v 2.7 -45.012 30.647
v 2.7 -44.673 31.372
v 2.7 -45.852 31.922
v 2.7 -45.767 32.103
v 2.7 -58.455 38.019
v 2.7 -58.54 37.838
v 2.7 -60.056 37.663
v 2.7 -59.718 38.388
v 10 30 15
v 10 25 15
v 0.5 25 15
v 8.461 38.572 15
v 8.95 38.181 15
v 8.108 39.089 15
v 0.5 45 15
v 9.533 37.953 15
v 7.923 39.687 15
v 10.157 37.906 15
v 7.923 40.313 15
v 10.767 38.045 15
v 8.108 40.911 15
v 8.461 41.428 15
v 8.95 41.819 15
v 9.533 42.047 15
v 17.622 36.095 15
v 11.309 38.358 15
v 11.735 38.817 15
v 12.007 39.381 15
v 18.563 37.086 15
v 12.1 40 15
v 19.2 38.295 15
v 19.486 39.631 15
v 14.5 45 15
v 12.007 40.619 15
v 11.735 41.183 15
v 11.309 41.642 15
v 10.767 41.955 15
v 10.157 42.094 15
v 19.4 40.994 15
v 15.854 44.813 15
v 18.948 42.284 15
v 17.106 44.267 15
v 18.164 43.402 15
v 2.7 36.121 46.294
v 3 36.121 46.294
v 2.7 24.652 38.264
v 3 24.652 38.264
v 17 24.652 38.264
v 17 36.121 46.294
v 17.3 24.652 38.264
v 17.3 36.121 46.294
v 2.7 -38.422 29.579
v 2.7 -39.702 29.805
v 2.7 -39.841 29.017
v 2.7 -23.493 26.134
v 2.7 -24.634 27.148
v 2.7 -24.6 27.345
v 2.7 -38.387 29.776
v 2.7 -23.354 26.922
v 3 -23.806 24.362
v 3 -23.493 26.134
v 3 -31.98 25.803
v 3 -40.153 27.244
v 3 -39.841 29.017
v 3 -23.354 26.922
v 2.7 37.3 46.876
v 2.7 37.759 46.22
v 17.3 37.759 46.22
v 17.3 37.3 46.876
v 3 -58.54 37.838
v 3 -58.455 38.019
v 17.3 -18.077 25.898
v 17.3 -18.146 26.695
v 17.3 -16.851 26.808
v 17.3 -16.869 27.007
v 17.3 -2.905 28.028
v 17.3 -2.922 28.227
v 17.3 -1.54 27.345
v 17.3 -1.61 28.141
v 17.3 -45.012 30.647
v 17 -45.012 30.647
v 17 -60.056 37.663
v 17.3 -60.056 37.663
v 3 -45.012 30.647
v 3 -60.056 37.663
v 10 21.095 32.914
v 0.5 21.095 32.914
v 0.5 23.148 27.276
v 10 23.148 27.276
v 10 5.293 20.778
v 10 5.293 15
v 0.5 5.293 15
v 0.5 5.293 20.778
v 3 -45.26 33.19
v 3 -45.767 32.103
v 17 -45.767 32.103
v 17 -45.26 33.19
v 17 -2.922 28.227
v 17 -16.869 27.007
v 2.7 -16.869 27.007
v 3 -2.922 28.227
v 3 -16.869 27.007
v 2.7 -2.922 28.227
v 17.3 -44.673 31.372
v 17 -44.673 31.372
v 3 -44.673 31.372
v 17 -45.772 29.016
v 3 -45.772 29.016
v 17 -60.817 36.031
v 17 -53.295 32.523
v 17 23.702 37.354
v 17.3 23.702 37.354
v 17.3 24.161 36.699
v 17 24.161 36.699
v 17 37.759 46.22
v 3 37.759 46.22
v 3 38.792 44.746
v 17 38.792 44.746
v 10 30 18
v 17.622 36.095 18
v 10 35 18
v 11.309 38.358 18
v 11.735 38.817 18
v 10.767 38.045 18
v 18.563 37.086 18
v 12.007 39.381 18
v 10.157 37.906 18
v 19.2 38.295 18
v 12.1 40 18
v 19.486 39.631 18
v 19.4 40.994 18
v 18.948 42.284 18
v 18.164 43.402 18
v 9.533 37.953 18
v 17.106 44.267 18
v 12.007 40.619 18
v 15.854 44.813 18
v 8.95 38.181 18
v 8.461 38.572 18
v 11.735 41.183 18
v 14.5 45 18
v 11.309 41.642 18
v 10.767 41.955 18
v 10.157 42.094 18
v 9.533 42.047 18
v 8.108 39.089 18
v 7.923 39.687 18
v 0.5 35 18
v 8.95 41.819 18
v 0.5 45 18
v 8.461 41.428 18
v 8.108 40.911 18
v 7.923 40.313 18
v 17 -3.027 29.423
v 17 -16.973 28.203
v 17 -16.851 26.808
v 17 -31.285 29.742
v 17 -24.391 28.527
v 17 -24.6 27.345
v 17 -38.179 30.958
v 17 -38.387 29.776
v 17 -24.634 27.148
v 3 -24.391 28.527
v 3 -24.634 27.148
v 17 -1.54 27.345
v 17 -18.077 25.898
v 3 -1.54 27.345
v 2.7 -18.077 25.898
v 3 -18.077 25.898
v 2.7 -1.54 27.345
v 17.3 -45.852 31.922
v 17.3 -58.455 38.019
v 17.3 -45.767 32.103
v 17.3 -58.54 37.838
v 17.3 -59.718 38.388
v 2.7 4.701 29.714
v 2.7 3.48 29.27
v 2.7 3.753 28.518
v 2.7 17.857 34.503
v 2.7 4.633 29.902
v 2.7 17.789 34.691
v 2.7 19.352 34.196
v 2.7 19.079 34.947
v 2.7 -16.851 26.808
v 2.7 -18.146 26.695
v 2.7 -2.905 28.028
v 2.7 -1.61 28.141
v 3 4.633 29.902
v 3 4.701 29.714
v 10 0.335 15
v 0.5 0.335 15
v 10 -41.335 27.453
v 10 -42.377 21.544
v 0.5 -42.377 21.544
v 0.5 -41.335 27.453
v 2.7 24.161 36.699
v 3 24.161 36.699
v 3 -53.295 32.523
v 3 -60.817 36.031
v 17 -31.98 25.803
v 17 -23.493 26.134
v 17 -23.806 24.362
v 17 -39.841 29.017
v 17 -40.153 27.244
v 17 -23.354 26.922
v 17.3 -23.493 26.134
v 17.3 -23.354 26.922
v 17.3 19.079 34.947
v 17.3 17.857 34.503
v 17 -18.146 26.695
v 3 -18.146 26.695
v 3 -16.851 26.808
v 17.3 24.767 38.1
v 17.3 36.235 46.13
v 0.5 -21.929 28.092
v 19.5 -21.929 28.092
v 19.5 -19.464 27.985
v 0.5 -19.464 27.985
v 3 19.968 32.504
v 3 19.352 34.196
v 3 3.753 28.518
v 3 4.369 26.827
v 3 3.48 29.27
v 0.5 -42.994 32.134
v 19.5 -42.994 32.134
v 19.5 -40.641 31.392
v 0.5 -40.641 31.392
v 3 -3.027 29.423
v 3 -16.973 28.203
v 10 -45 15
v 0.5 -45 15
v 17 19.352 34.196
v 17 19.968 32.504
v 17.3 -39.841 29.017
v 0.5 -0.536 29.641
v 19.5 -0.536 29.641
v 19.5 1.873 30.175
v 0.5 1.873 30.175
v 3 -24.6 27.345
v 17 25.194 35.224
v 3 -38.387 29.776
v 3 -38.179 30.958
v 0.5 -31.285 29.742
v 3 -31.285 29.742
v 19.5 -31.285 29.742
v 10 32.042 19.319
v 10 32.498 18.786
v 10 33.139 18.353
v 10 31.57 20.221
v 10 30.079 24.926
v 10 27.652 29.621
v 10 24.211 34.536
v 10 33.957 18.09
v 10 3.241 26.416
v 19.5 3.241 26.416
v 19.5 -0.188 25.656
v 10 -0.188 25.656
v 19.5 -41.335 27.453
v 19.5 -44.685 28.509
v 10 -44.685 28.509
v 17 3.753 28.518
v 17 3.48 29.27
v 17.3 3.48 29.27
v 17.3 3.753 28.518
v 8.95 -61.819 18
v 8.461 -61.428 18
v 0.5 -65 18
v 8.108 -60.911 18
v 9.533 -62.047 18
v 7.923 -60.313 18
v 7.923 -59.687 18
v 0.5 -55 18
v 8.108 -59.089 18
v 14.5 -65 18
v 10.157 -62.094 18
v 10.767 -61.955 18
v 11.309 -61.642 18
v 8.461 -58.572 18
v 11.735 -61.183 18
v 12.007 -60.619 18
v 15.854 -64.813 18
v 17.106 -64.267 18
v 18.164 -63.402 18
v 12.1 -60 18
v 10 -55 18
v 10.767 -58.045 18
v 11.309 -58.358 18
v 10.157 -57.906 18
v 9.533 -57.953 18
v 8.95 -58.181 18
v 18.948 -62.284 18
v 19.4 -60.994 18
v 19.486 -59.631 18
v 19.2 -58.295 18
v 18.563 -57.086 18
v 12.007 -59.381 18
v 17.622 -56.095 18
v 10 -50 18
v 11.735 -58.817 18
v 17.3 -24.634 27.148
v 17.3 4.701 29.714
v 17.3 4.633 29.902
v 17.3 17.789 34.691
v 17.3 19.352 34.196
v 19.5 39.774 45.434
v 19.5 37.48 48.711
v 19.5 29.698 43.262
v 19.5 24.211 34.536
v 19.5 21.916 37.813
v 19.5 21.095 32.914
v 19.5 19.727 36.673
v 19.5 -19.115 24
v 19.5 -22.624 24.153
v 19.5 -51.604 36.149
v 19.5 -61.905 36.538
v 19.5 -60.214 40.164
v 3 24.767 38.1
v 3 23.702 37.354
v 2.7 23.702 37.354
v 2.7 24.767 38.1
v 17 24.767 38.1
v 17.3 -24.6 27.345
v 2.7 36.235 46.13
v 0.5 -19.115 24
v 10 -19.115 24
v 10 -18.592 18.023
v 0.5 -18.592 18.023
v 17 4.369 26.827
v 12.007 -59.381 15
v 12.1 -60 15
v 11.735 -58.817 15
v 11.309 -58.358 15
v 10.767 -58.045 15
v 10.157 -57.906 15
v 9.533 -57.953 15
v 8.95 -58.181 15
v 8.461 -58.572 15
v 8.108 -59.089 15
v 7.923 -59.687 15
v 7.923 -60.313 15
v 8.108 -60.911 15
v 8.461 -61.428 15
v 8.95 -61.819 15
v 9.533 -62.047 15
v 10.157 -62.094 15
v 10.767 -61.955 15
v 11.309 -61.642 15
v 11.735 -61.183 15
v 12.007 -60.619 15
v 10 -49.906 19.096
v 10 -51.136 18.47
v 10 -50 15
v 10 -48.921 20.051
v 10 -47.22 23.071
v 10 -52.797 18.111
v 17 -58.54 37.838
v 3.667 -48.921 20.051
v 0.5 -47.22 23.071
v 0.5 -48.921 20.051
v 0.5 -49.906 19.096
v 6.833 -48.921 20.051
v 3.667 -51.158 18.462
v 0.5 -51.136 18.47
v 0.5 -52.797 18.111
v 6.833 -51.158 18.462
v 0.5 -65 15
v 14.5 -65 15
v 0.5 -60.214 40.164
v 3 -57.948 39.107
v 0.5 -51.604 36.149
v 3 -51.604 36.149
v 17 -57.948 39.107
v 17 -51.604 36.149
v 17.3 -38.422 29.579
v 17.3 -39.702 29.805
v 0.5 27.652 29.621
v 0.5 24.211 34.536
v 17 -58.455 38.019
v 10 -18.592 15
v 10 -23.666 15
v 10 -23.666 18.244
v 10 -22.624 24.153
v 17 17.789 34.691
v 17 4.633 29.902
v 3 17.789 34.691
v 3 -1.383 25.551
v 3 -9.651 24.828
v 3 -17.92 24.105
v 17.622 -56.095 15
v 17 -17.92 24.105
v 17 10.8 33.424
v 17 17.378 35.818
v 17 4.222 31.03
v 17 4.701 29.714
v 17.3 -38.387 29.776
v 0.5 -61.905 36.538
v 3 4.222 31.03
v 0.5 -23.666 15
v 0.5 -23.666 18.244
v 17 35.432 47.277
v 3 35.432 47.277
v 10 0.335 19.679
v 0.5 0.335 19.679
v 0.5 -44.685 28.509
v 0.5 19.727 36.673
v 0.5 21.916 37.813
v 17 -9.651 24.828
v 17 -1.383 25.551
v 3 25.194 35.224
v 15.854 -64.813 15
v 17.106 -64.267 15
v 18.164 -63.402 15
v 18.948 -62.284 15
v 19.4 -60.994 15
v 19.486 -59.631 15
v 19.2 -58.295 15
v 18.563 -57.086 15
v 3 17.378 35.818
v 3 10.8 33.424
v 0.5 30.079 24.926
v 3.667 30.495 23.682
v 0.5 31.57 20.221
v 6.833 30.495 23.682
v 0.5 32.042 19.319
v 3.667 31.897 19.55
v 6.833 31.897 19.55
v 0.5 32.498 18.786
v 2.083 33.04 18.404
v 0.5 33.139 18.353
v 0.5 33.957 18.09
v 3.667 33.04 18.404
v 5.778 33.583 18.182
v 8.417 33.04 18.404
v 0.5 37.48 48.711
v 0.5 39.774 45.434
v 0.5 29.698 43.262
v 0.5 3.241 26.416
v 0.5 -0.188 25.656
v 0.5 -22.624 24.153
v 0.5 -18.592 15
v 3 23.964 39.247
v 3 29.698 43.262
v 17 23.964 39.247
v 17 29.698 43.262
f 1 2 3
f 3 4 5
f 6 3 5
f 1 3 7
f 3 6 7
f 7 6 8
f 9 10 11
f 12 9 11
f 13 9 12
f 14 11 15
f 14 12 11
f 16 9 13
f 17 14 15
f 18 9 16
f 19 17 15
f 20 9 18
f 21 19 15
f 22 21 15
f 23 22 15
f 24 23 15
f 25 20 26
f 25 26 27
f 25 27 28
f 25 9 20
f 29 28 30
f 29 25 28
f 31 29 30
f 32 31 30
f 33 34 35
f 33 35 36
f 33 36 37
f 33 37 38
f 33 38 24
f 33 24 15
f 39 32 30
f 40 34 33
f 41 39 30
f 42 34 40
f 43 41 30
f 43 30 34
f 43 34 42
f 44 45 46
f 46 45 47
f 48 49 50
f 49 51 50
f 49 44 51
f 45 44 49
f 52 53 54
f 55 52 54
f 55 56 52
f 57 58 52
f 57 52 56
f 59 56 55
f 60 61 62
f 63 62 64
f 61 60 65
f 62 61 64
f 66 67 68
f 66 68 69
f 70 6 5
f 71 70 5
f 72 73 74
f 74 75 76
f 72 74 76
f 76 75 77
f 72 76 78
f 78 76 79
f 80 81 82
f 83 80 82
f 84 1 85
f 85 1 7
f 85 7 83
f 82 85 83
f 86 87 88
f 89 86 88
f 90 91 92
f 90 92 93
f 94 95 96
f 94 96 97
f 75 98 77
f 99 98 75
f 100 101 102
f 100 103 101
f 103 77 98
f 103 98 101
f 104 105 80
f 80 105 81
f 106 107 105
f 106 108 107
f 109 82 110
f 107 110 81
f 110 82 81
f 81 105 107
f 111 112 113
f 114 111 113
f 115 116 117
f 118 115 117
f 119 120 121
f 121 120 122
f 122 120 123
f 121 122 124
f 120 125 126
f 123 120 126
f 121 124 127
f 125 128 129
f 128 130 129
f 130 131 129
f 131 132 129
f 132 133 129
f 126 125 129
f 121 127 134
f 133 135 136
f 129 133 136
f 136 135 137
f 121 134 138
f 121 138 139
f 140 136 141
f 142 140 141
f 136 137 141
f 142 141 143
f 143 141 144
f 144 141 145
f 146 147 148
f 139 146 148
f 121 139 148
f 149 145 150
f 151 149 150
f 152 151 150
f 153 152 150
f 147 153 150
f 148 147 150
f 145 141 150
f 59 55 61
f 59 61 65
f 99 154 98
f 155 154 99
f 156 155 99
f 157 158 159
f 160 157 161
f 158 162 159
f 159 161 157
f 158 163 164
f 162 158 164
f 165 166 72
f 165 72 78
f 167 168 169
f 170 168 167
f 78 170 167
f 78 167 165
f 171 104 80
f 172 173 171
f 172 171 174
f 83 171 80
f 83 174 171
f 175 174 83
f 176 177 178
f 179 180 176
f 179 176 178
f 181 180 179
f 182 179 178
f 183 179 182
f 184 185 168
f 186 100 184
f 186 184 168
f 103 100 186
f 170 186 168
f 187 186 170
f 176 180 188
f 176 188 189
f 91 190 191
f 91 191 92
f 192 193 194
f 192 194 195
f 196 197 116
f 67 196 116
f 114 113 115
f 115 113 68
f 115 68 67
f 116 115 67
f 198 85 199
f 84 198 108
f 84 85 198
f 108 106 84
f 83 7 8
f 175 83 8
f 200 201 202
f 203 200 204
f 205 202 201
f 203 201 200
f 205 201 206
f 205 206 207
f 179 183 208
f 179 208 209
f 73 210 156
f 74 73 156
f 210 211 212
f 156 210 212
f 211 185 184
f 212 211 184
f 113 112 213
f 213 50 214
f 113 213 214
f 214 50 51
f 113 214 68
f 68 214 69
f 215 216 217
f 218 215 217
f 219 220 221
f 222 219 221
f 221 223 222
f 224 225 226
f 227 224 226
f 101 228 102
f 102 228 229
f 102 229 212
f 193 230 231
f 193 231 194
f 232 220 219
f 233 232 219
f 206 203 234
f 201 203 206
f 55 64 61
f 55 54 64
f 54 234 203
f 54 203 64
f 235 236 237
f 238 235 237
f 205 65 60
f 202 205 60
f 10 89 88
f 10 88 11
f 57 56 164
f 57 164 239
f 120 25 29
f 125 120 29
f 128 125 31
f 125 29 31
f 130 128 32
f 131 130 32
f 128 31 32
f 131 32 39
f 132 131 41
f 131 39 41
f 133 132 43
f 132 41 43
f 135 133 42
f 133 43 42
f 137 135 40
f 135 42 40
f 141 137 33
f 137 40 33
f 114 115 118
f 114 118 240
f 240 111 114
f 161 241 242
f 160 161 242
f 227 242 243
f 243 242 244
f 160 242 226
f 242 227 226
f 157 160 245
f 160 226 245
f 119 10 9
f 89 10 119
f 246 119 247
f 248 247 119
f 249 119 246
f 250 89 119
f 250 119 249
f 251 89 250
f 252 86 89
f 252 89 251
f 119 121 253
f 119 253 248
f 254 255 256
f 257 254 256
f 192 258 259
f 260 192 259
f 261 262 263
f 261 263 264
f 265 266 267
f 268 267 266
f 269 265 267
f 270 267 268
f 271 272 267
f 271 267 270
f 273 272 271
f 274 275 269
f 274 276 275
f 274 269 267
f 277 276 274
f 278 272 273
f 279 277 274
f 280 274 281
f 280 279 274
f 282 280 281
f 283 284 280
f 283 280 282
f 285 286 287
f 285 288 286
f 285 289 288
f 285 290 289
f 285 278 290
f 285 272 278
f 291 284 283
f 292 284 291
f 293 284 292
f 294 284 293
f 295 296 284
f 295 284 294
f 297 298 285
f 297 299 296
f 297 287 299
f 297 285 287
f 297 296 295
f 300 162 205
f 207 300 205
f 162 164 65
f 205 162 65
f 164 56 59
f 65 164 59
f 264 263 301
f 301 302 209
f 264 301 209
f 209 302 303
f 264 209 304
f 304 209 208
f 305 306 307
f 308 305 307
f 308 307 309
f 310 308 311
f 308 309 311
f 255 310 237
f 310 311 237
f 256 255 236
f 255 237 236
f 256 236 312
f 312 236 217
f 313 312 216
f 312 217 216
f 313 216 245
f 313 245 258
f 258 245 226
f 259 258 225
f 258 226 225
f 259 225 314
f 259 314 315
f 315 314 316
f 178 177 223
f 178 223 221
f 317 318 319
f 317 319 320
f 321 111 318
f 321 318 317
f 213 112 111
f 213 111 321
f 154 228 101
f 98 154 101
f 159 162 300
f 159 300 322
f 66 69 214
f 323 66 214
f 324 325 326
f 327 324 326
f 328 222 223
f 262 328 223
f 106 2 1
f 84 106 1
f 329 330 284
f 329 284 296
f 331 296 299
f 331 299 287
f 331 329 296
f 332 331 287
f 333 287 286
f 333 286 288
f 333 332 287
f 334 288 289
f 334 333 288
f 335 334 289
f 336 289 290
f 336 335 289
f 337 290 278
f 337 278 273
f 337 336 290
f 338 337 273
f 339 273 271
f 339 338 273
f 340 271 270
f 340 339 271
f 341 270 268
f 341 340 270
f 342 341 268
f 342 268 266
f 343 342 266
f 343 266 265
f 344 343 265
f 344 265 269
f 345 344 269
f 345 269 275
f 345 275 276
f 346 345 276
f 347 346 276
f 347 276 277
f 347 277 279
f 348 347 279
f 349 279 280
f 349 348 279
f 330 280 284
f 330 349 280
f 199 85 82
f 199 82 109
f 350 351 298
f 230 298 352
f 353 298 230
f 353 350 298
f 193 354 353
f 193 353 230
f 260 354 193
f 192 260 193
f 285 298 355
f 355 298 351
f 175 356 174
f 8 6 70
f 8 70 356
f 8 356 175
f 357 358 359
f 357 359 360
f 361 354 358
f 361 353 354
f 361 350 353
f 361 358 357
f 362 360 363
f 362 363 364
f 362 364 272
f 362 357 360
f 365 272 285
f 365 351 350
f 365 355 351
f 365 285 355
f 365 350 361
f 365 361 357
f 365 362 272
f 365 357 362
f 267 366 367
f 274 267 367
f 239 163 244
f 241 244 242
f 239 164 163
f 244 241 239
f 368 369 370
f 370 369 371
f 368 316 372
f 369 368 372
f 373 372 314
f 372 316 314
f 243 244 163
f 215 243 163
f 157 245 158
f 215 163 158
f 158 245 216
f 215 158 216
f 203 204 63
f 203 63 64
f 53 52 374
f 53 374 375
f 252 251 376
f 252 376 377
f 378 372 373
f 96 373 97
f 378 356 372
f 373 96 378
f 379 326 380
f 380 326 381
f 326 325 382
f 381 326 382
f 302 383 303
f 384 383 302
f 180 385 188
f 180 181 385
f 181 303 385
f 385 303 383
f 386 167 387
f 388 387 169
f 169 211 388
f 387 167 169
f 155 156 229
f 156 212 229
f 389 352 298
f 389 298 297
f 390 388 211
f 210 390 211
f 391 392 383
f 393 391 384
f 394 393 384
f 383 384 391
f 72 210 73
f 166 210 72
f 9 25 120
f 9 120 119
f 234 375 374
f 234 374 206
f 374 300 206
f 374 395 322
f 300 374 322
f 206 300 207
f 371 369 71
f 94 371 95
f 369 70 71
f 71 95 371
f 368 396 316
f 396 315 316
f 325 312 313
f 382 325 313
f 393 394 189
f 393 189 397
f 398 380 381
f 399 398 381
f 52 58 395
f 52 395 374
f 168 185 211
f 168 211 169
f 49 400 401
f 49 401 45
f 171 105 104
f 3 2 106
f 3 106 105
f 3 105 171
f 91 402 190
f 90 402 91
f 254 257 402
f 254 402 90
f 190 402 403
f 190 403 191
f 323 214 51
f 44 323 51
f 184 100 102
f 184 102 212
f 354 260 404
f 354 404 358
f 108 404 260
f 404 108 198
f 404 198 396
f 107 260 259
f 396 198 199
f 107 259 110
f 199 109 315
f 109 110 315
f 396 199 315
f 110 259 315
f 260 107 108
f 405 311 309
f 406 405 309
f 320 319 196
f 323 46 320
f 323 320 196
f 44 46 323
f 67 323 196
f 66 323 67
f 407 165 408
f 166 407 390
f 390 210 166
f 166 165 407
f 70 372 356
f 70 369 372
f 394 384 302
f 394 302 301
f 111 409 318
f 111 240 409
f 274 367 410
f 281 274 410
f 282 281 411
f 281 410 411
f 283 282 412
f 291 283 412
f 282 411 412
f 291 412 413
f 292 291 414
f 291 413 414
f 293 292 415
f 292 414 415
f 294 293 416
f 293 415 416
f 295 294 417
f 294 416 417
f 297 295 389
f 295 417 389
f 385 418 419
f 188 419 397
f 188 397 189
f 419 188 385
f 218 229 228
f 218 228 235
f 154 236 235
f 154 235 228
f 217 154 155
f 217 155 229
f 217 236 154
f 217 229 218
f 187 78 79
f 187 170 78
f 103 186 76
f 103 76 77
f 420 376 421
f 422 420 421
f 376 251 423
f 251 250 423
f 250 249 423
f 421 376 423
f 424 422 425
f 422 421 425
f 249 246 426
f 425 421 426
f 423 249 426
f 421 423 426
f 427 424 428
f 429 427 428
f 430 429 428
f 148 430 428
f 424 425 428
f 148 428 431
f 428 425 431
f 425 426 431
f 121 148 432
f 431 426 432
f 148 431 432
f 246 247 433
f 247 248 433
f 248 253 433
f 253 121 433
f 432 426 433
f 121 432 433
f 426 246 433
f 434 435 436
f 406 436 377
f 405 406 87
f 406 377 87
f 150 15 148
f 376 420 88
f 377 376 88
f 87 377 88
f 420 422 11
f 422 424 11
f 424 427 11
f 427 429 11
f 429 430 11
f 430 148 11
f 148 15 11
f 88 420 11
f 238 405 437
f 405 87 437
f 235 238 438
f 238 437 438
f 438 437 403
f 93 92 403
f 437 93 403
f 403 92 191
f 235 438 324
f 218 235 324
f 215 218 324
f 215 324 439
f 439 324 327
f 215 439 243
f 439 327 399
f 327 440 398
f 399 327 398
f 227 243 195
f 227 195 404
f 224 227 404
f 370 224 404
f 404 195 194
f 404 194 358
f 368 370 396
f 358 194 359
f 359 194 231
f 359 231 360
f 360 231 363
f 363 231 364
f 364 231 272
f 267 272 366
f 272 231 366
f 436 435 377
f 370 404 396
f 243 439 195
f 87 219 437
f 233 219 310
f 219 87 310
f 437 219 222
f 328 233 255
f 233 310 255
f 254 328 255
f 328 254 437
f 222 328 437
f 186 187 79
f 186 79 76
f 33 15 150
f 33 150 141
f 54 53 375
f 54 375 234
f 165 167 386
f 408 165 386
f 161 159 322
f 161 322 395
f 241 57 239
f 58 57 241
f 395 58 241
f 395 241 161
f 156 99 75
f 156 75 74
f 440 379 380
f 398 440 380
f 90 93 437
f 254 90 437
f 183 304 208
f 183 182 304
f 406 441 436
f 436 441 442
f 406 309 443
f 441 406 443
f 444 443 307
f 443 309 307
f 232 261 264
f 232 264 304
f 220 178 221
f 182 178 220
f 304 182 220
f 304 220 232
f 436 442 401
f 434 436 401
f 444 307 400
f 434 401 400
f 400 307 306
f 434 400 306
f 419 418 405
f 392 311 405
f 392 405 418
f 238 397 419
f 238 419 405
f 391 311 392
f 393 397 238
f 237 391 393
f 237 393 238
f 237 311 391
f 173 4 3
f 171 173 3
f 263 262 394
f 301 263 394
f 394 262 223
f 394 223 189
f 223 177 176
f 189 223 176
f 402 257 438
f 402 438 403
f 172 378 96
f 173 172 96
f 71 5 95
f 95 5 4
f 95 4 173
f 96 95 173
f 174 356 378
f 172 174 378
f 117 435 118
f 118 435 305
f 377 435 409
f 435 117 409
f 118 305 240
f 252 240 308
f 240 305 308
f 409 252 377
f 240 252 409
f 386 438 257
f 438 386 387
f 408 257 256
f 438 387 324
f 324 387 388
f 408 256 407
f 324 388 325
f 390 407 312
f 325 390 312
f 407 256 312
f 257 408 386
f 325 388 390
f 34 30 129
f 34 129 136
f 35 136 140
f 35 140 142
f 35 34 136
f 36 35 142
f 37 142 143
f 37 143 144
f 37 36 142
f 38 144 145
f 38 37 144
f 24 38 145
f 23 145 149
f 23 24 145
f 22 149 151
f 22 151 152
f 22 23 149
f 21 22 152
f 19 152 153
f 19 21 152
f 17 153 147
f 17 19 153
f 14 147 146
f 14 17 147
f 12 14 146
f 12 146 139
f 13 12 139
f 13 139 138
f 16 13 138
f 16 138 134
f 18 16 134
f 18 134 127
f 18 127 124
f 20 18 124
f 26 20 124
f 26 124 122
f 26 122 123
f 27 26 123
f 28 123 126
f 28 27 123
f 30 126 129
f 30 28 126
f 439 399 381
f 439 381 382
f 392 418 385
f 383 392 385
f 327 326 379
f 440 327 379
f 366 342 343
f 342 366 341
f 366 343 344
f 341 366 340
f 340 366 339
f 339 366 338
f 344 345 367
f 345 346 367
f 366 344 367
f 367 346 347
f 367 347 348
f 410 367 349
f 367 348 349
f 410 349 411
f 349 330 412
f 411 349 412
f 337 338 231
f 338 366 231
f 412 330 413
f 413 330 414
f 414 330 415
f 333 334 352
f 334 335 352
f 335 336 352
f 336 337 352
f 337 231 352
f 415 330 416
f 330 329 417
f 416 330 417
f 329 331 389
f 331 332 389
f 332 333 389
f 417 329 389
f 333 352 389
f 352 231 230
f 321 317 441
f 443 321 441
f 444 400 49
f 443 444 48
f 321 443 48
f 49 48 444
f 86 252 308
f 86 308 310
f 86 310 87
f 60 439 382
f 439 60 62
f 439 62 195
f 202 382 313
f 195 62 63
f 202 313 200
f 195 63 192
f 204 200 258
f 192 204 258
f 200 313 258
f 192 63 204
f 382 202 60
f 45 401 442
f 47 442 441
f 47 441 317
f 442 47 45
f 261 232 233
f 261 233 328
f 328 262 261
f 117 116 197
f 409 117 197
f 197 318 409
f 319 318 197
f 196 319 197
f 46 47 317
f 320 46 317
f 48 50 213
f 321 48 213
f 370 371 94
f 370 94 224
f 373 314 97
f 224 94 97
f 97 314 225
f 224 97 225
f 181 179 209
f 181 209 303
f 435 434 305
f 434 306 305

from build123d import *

# Parameters (mm, degrees)
PAD_DEPTH       = 9.5
PAD001_DEPTH    = 9.5
SKETCH002_R     = 2.1
PAD002_DEPTH    = 3
POCKET_DEPTH    = 7
POCKET001_DEPTH = 7.3


with BuildPart() as part:
    # Sketch → Pad (new body, symmetric)
    with BuildSketch(Plane.YZ):
        Polygon((-9.4638496319, 12.9847787924), (0, 13.8127583485), (9.4638496319, 14.6407379046), (11.8731622478, 15.1748696522), (20.8002421453, 18.4240610138), (29.7273220428, 21.6732523754), (31.9162958532, 22.8127600156), (39.698240274, 28.2617361609), (47.4801846947, 33.7107123063), (49.7744904401, 30.4341041291), (34.2106015986, 19.5361518385), (31.0954026161, 17.9144818922), (13.2412428211, 11.416099169), (9.8124726029, 10.6559591122), (-9.1152266609, 9), (-12.6239030908, 9.1531921213), (-31.335250398, 12.452507497), (-34.6847225392, 13.5085920065), (-51.9045704929, 21.5383389795), (-50.2140974459, 25.1635701277), (-41.604173469, 21.1486966411), (-32.9942494922, 17.1338231546), (-30.6406576873, 16.391738509), (-21.2849840337, 14.7420808212), (-11.9293103801, 13.0924231333), align=None)
    extrude(amount=PAD_DEPTH, both=True)

    # Sketch001 → Pad001 (join)
    with BuildSketch(Plane.YZ):
        with BuildLine():
            Line((-32.3771396349, 6.543661009), (-30.6406576873, 16.391738509))
            Line((-30.6406576873, 16.391738509), (-32.9942494922, 17.1338231546))
            Line((-32.9942494922, 17.1338231546), (-37.2204319887, 8.0707452278))
            add(Edge.make_bspline(
                [(-37.2204319887, 8.0707452278), (-39.0096730727, 4.2337052069), (-40, 3), (-45, 3)],
                knots=[0, 0, 0, 0, 1, 1, 1, 1], degree=3))
            Line((-45, 3), (-45, 0))
            Line((-45, 0), (-35, 0))
            Line((-35, 0), (-32.3771396349, 6.543661009))
        make_face()
        Polygon((-13.6657925125, 3.2443456659), (-11.9293103801, 13.0924231333), (-9.4638496319, 12.9847787924), (-8.5922920505, 3.0228318249), (-8.5922920505, 0), (-13.6657925125, 0), align=None)
        Polygon((15.2933760081, 5.777947931), (11.8731622478, 15.1748696522), (9.4638496319, 14.6407379046), (10.3354072218, 4.6787909379), (10.3354072218, 0), (15.2933760081, 0), align=None)
        with BuildLine():
            Line((37.6520787719, 14.6212525652), (31.9162958532, 22.8127600156))
            Line((31.9162958532, 22.8127600156), (29.7273220428, 21.6732523754))
            Line((29.7273220428, 21.6732523754), (33.1475397634, 12.2763320956))
            Line((33.1475397634, 12.2763320956), (35, 0))
            Line((35, 0), (45, 0))
            Line((45, 0), (45, 2.9999999999))
            add(Edge.make_bspline(
                [(37.6520787719, 14.6212525652), (42.2621602037, 8.0374056988), (40, 2.999999954), (45, 2.9999999999)],
                knots=[0, 0, 0, 0, 1, 1, 1, 1], degree=3))
        make_face()
    extrude(amount=-PAD001_DEPTH)

    # Sketch002 → Pad002 (join)
    with BuildSketch(Plane.XY):
        with BuildLine():
            Line((0, -45), (-9.5, -45))
            Line((-9.5, -45), (-9.5, -55))
            Line((-9.5, -55), (4.5, -55))
            ThreePointArc((4.5, -55), (9.218348401, -51.6544450327), (7.6224992299, -46.0948753465))
            Line((0, -40), (7.6224992299, -46.0948753465))
            Line((0, -45), (0, -40))
        make_face()
        with Locations((0, -50)):
            Circle(SKETCH002_R, mode=Mode.SUBTRACT)
        with BuildLine():
            Line((0, 40), (0, 45))
            Line((0, 45), (-9.5, 45))
            Line((-9.5, 45), (-9.5, 55))
            Line((-9.5, 55), (4.5, 55))
            ThreePointArc((7.6224992299, 46.0948753465), (9.218348401, 51.6544450327), (4.5, 55))
            Line((7.6224992299, 46.0948753465), (0, 40))
        make_face()
        with Locations((0, 50)):
            Circle(SKETCH002_R, mode=Mode.SUBTRACT)
    extrude(amount=PAD002_DEPTH)

    # Sketch003 → Pocket (cut, symmetric)
    with BuildSketch(Plane.YZ):
        Polygon((-41.604173469, 21.1486966411), (-47.9483279783, 24.1070244733), (-48.540006161, 22.8381994546), (-49.718193731, 23.3875973412), (-50.8170011484, 21.0311970654), (-43.294646516, 17.523465493), (-35.7722918836, 14.0157339205), (-34.6734849555, 16.3721344244), (-35.85169762, 16.9215440128), (-35.2600189598, 18.190368809), align=None)
        Polygon((-28.1786383048, 15.9576180648), (-21.2849840337, 14.7420808212), (-14.3913297626, 13.5265435775), (-14.6344411843, 12.1478134238), (-13.3541878452, 11.922070218), (-13.8056723944, 9.3615699345), (-21.9795767444, 10.8028498091), (-30.1534810944, 12.2441296838), (-29.7019944172, 14.804629592), (-28.4217543468, 14.5788887258), align=None)
        Polygon((-6.9733628866, 13.2026681492), (0, 13.8127583484), (6.9733628866, 14.4228485476), (7.095382718, 13.0281761271), (8.3904355218, 13.141478566), (8.6170389651, 10.5513722208), (0.348622971, 9.8279795561), (-7.9197930232, 9.1045868913), (-8.1463876723, 11.6946940059), (-6.8513440135, 11.8079956448), align=None)
        Polygon((14.2223937998, 16.0299200105), (20.8002421453, 18.4240610138), (27.3780904908, 20.818202017), (27.8569247953, 19.5026345695), (29.078522765, 19.9472598688), (29.9677714711, 17.5040577202), (22.1683227186, 14.6652905306), (14.3688739661, 11.826523341), (13.4796328313, 14.2697282453), (14.7012277436, 14.7143524317), align=None)
        Polygon((33.964175964, 24.2467011065), (39.698240274, 28.2617361609), (45.432304584, 32.2767712154), (46.2353249737, 31.1299677214), (47.3002248466, 31.8756186398), (48.7915131317, 29.7458160079), (42.5661276004, 24.1659795418), (35.1935891965, 20.2244471644), (33.7022965595, 22.3542467491), (34.7671909619, 23.0998938371), align=None)
    extrude(amount=POCKET_DEPTH, both=True, mode=Mode.SUBTRACT)

    # Sketch004 → Pocket001 (cut, symmetric)
    with BuildSketch(Plane.YZ):
        Polygon((-48.4554802378, 23.0194599531), (-35.767171314, 17.1028043329), (-35.85169762, 16.9215440128), (-34.6734849555, 16.3721344244), (-35.0115879447, 15.6470921024), (-50.0562968731, 22.6625550904), (-49.718193731, 23.3875973412), (-48.540006161, 22.8381994546), align=None)
        Polygon((-29.7019944172, 14.804629592), (-29.8409228744, 14.0167851379), (-13.4931156588, 11.1342256504), (-13.3541878452, 11.922070218), (-14.6344411843, 12.1478134238), (-14.5997166858, 12.3447758803), (-28.3870287718, 14.7758509925), (-28.4217543468, 14.5788887258), align=None)
        Polygon((-6.8687714614, 12.0072349082), (-6.8513440135, 11.8079956448), (-8.1463876723, 11.6946940059), (-8.0766611038, 10.8977384201), (8.4601662766, 12.3445233466), (8.3904355218, 13.141478566), (7.095382718, 13.0281761271), (7.0779548525, 13.2274153539), align=None)
        Polygon((14.6328259169, 14.9022917574), (14.7012277436, 14.7143524317), (13.4796328313, 14.2697282453), (13.753251107, 13.5179749352), (29.3521455498, 19.1955081999), (29.078522765, 19.9472598688), (27.8569247953, 19.5026345695), (27.7885225257, 19.690573734), align=None)
        Polygon((34.7671909619, 23.0998938371), (33.7022965595, 22.3542467491), (34.1611654182, 21.698930512), (47.7590897918, 31.2202996624), (47.3002248466, 31.8756186398), (46.2353249737, 31.1299677214), (46.1206093491, 31.2937978941), (34.6524768556, 23.2637250729), align=None)
    extrude(amount=POCKET001_DEPTH, both=True, mode=Mode.SUBTRACT)


with BuildPart() as part_1:
    # Body placement: moved
    add(part.part.moved(Location((10, -10, 15))))


solid = part_1.part
